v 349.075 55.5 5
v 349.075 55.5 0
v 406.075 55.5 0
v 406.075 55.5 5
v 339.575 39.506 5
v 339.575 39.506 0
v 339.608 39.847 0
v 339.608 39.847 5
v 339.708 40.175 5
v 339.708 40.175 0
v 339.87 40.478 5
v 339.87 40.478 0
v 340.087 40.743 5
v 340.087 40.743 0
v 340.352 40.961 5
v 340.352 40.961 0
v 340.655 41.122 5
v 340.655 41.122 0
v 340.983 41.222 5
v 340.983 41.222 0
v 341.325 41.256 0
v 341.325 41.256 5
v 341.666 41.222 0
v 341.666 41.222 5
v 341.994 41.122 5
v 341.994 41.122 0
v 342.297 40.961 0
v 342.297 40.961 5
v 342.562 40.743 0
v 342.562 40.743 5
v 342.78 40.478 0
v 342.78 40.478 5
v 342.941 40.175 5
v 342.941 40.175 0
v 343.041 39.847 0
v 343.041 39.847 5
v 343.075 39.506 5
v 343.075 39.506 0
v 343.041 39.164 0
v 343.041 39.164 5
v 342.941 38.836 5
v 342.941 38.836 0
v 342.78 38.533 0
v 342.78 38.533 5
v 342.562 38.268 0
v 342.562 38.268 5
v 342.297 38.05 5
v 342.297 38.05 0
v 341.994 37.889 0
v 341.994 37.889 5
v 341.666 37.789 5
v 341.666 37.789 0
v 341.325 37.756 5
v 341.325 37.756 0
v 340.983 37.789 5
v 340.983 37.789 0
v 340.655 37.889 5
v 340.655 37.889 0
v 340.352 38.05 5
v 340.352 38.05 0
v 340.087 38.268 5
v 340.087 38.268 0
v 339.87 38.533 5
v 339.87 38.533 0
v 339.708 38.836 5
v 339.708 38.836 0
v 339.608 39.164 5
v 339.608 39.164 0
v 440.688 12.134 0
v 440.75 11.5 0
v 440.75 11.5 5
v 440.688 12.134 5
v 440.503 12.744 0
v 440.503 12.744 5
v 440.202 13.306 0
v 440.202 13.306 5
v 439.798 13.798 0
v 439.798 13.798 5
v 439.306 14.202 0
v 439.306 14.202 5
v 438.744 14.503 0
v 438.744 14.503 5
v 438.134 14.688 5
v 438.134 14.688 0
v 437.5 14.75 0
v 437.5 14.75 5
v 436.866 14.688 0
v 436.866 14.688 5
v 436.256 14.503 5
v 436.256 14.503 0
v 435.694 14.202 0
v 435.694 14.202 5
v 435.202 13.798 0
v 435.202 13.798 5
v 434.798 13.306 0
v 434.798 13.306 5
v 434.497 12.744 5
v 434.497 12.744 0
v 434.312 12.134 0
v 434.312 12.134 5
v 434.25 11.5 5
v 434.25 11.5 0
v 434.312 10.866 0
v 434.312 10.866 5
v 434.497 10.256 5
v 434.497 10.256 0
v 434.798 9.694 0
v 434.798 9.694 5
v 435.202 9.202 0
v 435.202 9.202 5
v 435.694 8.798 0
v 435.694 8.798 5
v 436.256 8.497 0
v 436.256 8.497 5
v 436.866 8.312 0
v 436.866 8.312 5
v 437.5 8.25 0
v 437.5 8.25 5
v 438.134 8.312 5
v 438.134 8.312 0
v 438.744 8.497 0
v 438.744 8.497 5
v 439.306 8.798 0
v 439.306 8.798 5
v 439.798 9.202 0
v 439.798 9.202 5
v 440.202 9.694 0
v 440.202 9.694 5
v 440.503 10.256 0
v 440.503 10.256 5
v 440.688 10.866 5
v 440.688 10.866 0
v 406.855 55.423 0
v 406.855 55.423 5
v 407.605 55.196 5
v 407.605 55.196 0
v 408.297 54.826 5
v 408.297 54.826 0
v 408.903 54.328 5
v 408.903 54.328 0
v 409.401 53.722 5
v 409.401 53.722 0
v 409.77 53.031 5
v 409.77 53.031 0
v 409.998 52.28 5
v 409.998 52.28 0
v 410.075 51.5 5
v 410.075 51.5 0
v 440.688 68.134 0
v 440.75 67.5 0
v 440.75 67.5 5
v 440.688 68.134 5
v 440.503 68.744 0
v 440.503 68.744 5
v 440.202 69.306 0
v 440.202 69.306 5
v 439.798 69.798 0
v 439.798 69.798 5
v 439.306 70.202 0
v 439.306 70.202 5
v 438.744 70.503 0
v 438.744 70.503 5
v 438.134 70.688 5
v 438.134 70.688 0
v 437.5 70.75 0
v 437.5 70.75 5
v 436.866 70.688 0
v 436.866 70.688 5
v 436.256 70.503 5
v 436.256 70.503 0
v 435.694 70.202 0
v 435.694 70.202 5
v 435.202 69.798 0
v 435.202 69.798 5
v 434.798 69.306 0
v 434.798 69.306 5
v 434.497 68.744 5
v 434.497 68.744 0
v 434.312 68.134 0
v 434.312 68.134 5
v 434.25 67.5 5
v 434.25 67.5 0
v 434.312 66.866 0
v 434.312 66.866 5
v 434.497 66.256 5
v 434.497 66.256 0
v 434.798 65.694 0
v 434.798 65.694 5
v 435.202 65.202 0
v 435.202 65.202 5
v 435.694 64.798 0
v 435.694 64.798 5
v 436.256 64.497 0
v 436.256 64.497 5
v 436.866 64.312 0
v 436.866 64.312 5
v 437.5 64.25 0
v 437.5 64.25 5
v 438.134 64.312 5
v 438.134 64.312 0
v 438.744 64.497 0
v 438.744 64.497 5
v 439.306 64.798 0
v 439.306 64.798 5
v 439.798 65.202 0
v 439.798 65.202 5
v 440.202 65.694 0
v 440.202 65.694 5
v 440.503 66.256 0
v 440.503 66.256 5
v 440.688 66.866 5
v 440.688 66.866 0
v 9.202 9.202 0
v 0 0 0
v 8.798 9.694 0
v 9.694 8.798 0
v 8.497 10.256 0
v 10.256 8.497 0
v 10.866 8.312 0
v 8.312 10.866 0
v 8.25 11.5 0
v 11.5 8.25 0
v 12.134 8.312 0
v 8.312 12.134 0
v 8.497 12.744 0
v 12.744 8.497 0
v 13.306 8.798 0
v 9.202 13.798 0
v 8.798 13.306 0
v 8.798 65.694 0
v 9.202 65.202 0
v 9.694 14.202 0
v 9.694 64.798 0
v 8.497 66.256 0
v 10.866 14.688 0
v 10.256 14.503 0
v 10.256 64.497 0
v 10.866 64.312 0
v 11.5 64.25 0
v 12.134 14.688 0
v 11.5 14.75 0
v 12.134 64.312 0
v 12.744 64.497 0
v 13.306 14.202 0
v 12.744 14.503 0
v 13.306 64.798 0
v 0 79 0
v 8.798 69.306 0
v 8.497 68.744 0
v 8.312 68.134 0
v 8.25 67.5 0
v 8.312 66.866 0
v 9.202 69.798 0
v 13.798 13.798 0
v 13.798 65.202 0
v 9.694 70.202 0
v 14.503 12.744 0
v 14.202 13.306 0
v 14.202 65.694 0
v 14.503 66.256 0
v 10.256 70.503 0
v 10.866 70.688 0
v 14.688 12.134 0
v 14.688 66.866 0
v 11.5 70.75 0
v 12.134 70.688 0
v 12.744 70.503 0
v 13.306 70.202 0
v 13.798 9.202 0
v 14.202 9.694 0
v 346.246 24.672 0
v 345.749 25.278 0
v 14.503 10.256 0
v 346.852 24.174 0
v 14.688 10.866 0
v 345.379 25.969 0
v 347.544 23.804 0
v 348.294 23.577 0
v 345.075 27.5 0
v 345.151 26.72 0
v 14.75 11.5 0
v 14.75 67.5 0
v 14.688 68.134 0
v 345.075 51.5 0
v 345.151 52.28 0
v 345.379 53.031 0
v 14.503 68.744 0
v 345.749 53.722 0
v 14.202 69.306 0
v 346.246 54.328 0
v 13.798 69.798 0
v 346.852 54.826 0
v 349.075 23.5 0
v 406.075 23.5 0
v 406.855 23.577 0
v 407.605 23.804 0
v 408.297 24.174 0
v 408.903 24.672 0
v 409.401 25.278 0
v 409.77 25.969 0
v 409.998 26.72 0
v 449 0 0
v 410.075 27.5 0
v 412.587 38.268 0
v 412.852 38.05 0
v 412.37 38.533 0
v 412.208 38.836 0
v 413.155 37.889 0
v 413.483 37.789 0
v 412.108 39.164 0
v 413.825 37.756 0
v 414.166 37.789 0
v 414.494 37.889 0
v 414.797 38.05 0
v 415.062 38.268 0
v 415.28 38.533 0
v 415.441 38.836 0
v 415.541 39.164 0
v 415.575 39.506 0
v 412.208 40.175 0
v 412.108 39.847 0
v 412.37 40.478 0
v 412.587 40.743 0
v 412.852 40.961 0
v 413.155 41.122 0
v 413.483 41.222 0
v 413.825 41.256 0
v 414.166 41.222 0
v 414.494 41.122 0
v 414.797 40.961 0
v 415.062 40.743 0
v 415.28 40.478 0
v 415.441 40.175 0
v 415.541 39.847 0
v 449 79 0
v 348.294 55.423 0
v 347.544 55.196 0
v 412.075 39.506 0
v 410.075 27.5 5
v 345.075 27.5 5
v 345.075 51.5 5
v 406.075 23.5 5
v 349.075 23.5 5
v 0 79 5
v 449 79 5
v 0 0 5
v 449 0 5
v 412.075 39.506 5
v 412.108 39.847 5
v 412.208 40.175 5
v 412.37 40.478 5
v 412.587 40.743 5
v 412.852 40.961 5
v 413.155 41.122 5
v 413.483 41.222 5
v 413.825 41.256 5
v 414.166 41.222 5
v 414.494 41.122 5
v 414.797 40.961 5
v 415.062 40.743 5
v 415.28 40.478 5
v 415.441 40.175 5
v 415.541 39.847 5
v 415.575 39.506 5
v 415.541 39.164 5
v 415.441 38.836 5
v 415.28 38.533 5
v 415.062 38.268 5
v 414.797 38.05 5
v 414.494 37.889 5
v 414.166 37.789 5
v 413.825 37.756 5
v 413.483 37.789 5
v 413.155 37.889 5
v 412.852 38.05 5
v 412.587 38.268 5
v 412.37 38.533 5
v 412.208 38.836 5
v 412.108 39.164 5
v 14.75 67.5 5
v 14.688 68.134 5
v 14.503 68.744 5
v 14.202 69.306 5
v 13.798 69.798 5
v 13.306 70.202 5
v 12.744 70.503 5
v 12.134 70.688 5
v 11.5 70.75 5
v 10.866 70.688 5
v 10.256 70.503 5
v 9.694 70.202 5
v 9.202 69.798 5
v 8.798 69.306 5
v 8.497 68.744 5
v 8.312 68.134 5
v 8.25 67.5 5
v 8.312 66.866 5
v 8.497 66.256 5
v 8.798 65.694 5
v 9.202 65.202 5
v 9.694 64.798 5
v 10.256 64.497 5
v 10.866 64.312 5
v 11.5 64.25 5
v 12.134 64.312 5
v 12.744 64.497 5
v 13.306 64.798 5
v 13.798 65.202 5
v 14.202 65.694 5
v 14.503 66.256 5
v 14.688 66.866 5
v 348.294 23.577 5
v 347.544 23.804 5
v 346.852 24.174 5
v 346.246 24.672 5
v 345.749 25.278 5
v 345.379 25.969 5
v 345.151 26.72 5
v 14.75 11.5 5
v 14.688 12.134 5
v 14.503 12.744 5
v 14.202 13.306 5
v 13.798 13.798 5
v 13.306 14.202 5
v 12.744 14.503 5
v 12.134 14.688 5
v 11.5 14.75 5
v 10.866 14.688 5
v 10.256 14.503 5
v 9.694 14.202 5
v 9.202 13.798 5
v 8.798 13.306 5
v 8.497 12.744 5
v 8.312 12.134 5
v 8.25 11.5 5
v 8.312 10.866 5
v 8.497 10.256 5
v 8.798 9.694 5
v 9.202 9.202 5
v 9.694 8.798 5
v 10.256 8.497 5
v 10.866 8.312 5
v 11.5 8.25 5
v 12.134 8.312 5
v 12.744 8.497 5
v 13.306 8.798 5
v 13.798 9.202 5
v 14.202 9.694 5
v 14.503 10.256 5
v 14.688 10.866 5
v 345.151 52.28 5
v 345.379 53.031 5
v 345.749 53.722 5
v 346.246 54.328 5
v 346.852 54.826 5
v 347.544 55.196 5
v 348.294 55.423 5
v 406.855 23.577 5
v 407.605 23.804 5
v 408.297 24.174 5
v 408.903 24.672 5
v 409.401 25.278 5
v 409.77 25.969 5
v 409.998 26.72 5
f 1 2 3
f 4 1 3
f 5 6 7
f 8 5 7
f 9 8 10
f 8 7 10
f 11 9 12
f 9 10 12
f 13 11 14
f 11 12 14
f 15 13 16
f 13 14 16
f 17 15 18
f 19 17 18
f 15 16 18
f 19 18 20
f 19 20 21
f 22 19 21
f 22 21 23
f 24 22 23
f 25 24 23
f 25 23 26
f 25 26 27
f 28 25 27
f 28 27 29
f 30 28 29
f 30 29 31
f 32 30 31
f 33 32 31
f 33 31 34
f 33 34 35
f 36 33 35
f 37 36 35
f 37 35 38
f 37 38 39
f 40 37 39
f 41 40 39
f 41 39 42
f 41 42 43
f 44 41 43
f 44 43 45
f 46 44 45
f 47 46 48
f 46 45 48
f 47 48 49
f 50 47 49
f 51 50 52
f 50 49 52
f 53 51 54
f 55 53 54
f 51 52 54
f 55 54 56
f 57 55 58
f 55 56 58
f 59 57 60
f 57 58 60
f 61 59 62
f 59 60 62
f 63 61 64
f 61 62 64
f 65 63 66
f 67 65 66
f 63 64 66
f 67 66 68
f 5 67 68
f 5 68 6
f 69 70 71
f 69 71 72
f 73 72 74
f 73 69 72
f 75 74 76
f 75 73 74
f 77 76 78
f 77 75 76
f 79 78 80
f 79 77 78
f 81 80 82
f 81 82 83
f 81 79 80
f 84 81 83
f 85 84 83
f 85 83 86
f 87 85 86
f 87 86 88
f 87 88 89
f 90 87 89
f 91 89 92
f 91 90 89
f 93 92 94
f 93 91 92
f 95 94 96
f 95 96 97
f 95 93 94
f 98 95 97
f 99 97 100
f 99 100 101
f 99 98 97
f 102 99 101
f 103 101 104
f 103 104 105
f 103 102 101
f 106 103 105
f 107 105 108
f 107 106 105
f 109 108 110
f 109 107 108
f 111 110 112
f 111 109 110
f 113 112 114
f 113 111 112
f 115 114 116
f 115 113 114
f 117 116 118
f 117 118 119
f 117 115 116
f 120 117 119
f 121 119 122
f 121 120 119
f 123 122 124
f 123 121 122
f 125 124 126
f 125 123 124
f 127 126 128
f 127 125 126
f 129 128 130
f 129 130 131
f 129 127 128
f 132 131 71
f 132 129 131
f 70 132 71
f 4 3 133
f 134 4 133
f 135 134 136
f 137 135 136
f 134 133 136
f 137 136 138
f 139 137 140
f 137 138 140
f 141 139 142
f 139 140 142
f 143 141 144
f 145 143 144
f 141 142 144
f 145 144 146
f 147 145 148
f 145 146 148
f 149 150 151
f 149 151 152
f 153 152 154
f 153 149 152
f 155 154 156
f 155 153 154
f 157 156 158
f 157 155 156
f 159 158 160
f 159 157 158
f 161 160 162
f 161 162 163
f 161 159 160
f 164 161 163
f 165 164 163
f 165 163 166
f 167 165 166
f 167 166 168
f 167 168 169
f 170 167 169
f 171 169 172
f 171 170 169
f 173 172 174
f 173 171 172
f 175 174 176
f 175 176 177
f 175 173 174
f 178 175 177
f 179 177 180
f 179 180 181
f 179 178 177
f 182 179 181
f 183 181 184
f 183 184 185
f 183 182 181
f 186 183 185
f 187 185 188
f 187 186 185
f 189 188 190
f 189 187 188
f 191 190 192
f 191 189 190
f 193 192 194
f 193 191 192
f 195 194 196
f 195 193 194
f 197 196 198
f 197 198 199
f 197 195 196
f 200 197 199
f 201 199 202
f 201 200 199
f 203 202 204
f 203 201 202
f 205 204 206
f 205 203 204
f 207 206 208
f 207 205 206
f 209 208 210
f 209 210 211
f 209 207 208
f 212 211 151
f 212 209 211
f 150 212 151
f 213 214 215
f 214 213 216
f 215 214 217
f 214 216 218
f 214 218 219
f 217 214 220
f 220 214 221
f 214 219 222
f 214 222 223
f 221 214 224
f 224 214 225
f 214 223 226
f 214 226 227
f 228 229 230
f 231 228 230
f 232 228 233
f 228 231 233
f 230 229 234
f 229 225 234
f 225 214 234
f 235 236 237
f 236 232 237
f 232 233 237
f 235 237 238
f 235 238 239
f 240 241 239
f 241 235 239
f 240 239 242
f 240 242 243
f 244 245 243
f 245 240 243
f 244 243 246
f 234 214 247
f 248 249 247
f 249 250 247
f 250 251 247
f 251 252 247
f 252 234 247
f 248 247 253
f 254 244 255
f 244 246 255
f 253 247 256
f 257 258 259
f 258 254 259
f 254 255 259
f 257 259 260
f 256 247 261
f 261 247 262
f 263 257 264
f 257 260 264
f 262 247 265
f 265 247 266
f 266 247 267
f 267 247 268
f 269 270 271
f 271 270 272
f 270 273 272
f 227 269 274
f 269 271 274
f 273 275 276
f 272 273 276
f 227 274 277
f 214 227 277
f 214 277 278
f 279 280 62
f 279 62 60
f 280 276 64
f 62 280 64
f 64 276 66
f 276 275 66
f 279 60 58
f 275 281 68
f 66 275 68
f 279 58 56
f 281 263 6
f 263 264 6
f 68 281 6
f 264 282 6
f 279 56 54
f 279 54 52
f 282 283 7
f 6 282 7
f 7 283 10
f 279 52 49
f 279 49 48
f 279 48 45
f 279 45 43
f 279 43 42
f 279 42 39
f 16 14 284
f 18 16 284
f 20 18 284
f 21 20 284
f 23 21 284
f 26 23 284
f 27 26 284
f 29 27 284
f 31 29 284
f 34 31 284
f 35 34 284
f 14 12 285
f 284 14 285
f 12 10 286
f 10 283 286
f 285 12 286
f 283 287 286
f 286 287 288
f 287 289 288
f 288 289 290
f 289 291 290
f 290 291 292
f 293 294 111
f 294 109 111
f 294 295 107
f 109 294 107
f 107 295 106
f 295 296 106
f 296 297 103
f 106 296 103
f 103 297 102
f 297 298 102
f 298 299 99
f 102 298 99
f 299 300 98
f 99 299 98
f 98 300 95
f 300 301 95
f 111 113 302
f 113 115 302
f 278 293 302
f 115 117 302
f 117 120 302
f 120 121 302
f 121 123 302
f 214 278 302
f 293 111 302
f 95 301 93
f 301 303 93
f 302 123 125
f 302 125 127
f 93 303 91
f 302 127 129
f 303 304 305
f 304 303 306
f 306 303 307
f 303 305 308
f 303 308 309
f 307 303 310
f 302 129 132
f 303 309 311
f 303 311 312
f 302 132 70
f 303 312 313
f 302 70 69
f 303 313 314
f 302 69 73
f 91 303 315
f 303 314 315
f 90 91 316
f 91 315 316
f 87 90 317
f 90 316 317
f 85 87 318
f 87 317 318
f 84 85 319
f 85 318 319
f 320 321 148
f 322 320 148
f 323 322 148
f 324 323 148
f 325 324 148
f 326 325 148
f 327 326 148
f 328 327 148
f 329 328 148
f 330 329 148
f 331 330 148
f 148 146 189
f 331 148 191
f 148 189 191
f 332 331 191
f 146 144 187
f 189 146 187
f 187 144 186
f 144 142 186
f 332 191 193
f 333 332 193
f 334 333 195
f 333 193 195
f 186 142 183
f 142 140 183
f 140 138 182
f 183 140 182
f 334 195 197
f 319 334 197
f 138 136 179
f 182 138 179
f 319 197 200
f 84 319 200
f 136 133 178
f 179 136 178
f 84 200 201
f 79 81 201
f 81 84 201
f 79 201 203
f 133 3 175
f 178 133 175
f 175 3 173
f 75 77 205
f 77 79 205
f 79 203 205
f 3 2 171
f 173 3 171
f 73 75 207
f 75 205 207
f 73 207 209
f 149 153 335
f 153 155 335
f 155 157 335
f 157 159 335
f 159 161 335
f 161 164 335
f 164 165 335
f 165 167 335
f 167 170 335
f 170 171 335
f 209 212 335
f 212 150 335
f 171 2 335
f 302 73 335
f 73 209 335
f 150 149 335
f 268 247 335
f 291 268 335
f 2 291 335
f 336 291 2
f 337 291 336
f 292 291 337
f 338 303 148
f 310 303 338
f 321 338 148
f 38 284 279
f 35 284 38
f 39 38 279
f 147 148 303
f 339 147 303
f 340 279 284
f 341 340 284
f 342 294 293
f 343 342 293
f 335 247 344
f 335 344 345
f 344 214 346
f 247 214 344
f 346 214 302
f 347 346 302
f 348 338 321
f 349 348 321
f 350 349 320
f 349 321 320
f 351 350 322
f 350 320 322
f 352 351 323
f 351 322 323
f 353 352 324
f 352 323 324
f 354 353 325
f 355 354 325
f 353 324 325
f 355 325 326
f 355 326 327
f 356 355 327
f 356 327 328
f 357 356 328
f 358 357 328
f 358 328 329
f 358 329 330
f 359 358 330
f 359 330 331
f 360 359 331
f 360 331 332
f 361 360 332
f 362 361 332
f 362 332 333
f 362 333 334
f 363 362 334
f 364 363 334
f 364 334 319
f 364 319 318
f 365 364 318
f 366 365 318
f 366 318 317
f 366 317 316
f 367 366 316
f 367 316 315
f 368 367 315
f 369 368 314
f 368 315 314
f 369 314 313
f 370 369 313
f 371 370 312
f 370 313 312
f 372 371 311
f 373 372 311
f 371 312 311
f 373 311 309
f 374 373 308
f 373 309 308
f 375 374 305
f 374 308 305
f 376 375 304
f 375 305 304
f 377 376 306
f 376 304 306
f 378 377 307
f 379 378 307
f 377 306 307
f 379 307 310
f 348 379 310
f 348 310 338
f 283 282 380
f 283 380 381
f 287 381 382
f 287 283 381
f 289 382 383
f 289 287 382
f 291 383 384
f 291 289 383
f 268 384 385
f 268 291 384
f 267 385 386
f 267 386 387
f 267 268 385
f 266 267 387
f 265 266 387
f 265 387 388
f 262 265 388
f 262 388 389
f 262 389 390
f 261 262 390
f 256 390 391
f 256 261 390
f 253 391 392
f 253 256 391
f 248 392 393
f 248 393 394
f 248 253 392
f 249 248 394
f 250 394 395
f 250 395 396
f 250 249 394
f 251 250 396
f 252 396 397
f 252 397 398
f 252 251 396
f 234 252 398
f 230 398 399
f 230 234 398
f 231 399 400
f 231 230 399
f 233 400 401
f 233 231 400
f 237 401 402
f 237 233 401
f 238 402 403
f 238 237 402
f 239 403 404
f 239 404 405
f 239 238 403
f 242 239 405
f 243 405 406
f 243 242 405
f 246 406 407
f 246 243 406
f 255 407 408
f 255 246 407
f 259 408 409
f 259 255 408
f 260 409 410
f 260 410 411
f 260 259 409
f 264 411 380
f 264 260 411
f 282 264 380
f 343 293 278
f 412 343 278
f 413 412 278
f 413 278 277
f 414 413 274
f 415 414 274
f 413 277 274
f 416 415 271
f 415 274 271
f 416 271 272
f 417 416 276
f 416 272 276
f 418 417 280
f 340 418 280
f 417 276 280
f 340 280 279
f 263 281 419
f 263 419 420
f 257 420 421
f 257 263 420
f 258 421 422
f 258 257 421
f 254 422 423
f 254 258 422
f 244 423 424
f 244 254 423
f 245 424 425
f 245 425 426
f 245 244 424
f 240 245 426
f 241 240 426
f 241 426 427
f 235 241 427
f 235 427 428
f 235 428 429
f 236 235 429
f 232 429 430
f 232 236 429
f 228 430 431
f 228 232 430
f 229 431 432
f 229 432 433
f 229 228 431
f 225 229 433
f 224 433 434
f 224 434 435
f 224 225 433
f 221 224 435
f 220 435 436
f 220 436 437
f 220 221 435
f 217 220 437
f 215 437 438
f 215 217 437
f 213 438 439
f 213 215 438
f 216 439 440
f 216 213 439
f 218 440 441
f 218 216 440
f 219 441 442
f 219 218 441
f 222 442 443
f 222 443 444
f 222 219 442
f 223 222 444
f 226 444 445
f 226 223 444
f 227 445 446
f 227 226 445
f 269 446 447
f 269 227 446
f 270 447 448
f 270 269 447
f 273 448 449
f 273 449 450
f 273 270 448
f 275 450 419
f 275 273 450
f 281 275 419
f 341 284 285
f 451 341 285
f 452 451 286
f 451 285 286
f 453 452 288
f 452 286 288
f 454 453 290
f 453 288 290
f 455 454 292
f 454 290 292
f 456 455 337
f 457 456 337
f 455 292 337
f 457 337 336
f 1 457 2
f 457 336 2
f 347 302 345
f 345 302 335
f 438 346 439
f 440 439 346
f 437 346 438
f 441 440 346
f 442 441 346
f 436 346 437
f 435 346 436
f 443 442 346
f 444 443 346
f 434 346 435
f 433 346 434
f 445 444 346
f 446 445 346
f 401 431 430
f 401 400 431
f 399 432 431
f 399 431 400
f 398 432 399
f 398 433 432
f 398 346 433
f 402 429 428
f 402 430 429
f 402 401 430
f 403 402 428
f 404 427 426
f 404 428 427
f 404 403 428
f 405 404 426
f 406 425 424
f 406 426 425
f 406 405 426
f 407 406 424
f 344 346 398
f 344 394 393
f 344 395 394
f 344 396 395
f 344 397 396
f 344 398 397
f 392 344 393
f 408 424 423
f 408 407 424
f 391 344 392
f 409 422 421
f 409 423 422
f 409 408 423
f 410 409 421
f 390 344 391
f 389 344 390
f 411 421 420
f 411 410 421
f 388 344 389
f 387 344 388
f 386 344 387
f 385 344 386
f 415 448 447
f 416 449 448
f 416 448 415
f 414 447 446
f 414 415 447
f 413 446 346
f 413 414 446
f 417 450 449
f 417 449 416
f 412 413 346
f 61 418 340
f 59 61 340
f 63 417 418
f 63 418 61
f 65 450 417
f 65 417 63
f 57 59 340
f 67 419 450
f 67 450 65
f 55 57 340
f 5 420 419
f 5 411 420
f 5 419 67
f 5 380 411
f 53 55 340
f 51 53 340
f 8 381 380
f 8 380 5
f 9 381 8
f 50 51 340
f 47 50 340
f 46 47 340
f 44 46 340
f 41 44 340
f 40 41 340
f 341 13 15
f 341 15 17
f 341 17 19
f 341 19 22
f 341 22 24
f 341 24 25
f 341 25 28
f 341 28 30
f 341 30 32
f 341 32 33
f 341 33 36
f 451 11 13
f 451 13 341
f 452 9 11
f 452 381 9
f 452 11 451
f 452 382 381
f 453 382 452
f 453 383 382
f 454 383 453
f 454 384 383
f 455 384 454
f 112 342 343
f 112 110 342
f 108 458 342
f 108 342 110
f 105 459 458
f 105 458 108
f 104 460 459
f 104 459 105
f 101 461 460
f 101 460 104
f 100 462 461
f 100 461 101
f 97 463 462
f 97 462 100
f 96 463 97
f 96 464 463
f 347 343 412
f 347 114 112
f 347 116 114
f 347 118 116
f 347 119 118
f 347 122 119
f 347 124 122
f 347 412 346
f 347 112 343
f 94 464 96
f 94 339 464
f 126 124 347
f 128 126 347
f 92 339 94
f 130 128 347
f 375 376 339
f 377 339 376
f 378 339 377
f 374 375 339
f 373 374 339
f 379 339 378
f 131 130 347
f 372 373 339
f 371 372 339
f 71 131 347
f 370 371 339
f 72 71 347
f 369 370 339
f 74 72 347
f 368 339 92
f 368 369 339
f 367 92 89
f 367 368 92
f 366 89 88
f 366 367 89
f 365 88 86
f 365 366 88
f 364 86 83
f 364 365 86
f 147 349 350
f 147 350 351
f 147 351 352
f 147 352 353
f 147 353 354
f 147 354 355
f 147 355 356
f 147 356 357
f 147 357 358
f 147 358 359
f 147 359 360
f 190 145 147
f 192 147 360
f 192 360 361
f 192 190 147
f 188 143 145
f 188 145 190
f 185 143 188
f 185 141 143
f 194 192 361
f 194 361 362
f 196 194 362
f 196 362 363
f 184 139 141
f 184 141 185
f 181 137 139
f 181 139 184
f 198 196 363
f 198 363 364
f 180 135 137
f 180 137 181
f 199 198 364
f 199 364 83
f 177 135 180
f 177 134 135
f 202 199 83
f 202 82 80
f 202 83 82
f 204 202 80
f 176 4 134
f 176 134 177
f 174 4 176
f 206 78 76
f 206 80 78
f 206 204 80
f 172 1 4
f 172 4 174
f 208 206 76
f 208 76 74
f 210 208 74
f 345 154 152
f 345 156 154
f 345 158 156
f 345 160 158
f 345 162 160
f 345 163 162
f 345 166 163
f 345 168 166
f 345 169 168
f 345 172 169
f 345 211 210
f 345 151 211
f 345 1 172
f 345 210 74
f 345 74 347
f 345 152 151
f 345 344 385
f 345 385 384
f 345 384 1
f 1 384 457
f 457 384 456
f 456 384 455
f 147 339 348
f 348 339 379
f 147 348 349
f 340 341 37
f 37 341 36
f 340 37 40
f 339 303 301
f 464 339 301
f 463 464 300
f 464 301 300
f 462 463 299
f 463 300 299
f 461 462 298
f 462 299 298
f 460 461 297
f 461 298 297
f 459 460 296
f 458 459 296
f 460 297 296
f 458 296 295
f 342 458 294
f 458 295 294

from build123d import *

# Parameters (mm, degrees)
SKETCH_F_W                   = 449
SKETCH_F_H                   = 79
SKETCH_F_R                   = 3.25
ESTRUSIONE_ESTRUSIONE1_DEPTH = 5
SKETCH1_R                    = 1.75
EXTRUDE1_DEPTH               = 6


with BuildPart() as part:
    # Sketch f → Estrusione-Estrusione1 (new body)
    with BuildSketch(Plane.XY):
        with Locations((224.5, 39.5)):
            Rectangle(SKETCH_F_W, SKETCH_F_H)
        with Locations((11.5, 67.5)):
            Circle(SKETCH_F_R, mode=Mode.SUBTRACT)
        with Locations((437.5, 67.5)):
            Circle(SKETCH_F_R, mode=Mode.SUBTRACT)
        with Locations((11.5, 11.5)):
            Circle(SKETCH_F_R, mode=Mode.SUBTRACT)
        with Locations((437.5, 11.5)):
            Circle(SKETCH_F_R, mode=Mode.SUBTRACT)
    extrude(amount=ESTRUSIONE_ESTRUSIONE1_DEPTH)

    # Sketch1 → Extrude1 (cut, through all)
    with BuildSketch(Plane(origin=(0, 0, 0), x_dir=(-1, 0, 0), z_dir=(0, 0, -1))):
        with Locations((-341.3246338, 39.505506417)):
            Circle(SKETCH1_R)
        with Locations((-413.8246338, 39.505506417)):
            Circle(SKETCH1_R)
        with BuildLine():
            Line((-349.0746338, 55.5), (-406.0746338, 55.5))
            ThreePointArc((-406.0746338, 55.5), (-408.903060925, 54.328427125), (-410.0746338, 51.5))
            Line((-410.0746338, 51.5), (-410.0746338, 27.5))
            ThreePointArc((-410.0746338, 27.5), (-408.903060925, 24.671572875), (-406.0746338, 23.5))
            Line((-406.0746338, 23.5), (-349.0746338, 23.5))
            ThreePointArc((-349.0746338, 23.5), (-346.246206675, 24.671572875), (-345.0746338, 27.5))
            Line((-345.0746338, 27.5), (-345.0746338, 51.5))
            ThreePointArc((-345.0746338, 51.5), (-346.246206675, 54.328427125), (-349.0746338, 55.5))
        make_face()
    extrude(amount=-EXTRUDE1_DEPTH, mode=Mode.SUBTRACT)


solid = part.part
